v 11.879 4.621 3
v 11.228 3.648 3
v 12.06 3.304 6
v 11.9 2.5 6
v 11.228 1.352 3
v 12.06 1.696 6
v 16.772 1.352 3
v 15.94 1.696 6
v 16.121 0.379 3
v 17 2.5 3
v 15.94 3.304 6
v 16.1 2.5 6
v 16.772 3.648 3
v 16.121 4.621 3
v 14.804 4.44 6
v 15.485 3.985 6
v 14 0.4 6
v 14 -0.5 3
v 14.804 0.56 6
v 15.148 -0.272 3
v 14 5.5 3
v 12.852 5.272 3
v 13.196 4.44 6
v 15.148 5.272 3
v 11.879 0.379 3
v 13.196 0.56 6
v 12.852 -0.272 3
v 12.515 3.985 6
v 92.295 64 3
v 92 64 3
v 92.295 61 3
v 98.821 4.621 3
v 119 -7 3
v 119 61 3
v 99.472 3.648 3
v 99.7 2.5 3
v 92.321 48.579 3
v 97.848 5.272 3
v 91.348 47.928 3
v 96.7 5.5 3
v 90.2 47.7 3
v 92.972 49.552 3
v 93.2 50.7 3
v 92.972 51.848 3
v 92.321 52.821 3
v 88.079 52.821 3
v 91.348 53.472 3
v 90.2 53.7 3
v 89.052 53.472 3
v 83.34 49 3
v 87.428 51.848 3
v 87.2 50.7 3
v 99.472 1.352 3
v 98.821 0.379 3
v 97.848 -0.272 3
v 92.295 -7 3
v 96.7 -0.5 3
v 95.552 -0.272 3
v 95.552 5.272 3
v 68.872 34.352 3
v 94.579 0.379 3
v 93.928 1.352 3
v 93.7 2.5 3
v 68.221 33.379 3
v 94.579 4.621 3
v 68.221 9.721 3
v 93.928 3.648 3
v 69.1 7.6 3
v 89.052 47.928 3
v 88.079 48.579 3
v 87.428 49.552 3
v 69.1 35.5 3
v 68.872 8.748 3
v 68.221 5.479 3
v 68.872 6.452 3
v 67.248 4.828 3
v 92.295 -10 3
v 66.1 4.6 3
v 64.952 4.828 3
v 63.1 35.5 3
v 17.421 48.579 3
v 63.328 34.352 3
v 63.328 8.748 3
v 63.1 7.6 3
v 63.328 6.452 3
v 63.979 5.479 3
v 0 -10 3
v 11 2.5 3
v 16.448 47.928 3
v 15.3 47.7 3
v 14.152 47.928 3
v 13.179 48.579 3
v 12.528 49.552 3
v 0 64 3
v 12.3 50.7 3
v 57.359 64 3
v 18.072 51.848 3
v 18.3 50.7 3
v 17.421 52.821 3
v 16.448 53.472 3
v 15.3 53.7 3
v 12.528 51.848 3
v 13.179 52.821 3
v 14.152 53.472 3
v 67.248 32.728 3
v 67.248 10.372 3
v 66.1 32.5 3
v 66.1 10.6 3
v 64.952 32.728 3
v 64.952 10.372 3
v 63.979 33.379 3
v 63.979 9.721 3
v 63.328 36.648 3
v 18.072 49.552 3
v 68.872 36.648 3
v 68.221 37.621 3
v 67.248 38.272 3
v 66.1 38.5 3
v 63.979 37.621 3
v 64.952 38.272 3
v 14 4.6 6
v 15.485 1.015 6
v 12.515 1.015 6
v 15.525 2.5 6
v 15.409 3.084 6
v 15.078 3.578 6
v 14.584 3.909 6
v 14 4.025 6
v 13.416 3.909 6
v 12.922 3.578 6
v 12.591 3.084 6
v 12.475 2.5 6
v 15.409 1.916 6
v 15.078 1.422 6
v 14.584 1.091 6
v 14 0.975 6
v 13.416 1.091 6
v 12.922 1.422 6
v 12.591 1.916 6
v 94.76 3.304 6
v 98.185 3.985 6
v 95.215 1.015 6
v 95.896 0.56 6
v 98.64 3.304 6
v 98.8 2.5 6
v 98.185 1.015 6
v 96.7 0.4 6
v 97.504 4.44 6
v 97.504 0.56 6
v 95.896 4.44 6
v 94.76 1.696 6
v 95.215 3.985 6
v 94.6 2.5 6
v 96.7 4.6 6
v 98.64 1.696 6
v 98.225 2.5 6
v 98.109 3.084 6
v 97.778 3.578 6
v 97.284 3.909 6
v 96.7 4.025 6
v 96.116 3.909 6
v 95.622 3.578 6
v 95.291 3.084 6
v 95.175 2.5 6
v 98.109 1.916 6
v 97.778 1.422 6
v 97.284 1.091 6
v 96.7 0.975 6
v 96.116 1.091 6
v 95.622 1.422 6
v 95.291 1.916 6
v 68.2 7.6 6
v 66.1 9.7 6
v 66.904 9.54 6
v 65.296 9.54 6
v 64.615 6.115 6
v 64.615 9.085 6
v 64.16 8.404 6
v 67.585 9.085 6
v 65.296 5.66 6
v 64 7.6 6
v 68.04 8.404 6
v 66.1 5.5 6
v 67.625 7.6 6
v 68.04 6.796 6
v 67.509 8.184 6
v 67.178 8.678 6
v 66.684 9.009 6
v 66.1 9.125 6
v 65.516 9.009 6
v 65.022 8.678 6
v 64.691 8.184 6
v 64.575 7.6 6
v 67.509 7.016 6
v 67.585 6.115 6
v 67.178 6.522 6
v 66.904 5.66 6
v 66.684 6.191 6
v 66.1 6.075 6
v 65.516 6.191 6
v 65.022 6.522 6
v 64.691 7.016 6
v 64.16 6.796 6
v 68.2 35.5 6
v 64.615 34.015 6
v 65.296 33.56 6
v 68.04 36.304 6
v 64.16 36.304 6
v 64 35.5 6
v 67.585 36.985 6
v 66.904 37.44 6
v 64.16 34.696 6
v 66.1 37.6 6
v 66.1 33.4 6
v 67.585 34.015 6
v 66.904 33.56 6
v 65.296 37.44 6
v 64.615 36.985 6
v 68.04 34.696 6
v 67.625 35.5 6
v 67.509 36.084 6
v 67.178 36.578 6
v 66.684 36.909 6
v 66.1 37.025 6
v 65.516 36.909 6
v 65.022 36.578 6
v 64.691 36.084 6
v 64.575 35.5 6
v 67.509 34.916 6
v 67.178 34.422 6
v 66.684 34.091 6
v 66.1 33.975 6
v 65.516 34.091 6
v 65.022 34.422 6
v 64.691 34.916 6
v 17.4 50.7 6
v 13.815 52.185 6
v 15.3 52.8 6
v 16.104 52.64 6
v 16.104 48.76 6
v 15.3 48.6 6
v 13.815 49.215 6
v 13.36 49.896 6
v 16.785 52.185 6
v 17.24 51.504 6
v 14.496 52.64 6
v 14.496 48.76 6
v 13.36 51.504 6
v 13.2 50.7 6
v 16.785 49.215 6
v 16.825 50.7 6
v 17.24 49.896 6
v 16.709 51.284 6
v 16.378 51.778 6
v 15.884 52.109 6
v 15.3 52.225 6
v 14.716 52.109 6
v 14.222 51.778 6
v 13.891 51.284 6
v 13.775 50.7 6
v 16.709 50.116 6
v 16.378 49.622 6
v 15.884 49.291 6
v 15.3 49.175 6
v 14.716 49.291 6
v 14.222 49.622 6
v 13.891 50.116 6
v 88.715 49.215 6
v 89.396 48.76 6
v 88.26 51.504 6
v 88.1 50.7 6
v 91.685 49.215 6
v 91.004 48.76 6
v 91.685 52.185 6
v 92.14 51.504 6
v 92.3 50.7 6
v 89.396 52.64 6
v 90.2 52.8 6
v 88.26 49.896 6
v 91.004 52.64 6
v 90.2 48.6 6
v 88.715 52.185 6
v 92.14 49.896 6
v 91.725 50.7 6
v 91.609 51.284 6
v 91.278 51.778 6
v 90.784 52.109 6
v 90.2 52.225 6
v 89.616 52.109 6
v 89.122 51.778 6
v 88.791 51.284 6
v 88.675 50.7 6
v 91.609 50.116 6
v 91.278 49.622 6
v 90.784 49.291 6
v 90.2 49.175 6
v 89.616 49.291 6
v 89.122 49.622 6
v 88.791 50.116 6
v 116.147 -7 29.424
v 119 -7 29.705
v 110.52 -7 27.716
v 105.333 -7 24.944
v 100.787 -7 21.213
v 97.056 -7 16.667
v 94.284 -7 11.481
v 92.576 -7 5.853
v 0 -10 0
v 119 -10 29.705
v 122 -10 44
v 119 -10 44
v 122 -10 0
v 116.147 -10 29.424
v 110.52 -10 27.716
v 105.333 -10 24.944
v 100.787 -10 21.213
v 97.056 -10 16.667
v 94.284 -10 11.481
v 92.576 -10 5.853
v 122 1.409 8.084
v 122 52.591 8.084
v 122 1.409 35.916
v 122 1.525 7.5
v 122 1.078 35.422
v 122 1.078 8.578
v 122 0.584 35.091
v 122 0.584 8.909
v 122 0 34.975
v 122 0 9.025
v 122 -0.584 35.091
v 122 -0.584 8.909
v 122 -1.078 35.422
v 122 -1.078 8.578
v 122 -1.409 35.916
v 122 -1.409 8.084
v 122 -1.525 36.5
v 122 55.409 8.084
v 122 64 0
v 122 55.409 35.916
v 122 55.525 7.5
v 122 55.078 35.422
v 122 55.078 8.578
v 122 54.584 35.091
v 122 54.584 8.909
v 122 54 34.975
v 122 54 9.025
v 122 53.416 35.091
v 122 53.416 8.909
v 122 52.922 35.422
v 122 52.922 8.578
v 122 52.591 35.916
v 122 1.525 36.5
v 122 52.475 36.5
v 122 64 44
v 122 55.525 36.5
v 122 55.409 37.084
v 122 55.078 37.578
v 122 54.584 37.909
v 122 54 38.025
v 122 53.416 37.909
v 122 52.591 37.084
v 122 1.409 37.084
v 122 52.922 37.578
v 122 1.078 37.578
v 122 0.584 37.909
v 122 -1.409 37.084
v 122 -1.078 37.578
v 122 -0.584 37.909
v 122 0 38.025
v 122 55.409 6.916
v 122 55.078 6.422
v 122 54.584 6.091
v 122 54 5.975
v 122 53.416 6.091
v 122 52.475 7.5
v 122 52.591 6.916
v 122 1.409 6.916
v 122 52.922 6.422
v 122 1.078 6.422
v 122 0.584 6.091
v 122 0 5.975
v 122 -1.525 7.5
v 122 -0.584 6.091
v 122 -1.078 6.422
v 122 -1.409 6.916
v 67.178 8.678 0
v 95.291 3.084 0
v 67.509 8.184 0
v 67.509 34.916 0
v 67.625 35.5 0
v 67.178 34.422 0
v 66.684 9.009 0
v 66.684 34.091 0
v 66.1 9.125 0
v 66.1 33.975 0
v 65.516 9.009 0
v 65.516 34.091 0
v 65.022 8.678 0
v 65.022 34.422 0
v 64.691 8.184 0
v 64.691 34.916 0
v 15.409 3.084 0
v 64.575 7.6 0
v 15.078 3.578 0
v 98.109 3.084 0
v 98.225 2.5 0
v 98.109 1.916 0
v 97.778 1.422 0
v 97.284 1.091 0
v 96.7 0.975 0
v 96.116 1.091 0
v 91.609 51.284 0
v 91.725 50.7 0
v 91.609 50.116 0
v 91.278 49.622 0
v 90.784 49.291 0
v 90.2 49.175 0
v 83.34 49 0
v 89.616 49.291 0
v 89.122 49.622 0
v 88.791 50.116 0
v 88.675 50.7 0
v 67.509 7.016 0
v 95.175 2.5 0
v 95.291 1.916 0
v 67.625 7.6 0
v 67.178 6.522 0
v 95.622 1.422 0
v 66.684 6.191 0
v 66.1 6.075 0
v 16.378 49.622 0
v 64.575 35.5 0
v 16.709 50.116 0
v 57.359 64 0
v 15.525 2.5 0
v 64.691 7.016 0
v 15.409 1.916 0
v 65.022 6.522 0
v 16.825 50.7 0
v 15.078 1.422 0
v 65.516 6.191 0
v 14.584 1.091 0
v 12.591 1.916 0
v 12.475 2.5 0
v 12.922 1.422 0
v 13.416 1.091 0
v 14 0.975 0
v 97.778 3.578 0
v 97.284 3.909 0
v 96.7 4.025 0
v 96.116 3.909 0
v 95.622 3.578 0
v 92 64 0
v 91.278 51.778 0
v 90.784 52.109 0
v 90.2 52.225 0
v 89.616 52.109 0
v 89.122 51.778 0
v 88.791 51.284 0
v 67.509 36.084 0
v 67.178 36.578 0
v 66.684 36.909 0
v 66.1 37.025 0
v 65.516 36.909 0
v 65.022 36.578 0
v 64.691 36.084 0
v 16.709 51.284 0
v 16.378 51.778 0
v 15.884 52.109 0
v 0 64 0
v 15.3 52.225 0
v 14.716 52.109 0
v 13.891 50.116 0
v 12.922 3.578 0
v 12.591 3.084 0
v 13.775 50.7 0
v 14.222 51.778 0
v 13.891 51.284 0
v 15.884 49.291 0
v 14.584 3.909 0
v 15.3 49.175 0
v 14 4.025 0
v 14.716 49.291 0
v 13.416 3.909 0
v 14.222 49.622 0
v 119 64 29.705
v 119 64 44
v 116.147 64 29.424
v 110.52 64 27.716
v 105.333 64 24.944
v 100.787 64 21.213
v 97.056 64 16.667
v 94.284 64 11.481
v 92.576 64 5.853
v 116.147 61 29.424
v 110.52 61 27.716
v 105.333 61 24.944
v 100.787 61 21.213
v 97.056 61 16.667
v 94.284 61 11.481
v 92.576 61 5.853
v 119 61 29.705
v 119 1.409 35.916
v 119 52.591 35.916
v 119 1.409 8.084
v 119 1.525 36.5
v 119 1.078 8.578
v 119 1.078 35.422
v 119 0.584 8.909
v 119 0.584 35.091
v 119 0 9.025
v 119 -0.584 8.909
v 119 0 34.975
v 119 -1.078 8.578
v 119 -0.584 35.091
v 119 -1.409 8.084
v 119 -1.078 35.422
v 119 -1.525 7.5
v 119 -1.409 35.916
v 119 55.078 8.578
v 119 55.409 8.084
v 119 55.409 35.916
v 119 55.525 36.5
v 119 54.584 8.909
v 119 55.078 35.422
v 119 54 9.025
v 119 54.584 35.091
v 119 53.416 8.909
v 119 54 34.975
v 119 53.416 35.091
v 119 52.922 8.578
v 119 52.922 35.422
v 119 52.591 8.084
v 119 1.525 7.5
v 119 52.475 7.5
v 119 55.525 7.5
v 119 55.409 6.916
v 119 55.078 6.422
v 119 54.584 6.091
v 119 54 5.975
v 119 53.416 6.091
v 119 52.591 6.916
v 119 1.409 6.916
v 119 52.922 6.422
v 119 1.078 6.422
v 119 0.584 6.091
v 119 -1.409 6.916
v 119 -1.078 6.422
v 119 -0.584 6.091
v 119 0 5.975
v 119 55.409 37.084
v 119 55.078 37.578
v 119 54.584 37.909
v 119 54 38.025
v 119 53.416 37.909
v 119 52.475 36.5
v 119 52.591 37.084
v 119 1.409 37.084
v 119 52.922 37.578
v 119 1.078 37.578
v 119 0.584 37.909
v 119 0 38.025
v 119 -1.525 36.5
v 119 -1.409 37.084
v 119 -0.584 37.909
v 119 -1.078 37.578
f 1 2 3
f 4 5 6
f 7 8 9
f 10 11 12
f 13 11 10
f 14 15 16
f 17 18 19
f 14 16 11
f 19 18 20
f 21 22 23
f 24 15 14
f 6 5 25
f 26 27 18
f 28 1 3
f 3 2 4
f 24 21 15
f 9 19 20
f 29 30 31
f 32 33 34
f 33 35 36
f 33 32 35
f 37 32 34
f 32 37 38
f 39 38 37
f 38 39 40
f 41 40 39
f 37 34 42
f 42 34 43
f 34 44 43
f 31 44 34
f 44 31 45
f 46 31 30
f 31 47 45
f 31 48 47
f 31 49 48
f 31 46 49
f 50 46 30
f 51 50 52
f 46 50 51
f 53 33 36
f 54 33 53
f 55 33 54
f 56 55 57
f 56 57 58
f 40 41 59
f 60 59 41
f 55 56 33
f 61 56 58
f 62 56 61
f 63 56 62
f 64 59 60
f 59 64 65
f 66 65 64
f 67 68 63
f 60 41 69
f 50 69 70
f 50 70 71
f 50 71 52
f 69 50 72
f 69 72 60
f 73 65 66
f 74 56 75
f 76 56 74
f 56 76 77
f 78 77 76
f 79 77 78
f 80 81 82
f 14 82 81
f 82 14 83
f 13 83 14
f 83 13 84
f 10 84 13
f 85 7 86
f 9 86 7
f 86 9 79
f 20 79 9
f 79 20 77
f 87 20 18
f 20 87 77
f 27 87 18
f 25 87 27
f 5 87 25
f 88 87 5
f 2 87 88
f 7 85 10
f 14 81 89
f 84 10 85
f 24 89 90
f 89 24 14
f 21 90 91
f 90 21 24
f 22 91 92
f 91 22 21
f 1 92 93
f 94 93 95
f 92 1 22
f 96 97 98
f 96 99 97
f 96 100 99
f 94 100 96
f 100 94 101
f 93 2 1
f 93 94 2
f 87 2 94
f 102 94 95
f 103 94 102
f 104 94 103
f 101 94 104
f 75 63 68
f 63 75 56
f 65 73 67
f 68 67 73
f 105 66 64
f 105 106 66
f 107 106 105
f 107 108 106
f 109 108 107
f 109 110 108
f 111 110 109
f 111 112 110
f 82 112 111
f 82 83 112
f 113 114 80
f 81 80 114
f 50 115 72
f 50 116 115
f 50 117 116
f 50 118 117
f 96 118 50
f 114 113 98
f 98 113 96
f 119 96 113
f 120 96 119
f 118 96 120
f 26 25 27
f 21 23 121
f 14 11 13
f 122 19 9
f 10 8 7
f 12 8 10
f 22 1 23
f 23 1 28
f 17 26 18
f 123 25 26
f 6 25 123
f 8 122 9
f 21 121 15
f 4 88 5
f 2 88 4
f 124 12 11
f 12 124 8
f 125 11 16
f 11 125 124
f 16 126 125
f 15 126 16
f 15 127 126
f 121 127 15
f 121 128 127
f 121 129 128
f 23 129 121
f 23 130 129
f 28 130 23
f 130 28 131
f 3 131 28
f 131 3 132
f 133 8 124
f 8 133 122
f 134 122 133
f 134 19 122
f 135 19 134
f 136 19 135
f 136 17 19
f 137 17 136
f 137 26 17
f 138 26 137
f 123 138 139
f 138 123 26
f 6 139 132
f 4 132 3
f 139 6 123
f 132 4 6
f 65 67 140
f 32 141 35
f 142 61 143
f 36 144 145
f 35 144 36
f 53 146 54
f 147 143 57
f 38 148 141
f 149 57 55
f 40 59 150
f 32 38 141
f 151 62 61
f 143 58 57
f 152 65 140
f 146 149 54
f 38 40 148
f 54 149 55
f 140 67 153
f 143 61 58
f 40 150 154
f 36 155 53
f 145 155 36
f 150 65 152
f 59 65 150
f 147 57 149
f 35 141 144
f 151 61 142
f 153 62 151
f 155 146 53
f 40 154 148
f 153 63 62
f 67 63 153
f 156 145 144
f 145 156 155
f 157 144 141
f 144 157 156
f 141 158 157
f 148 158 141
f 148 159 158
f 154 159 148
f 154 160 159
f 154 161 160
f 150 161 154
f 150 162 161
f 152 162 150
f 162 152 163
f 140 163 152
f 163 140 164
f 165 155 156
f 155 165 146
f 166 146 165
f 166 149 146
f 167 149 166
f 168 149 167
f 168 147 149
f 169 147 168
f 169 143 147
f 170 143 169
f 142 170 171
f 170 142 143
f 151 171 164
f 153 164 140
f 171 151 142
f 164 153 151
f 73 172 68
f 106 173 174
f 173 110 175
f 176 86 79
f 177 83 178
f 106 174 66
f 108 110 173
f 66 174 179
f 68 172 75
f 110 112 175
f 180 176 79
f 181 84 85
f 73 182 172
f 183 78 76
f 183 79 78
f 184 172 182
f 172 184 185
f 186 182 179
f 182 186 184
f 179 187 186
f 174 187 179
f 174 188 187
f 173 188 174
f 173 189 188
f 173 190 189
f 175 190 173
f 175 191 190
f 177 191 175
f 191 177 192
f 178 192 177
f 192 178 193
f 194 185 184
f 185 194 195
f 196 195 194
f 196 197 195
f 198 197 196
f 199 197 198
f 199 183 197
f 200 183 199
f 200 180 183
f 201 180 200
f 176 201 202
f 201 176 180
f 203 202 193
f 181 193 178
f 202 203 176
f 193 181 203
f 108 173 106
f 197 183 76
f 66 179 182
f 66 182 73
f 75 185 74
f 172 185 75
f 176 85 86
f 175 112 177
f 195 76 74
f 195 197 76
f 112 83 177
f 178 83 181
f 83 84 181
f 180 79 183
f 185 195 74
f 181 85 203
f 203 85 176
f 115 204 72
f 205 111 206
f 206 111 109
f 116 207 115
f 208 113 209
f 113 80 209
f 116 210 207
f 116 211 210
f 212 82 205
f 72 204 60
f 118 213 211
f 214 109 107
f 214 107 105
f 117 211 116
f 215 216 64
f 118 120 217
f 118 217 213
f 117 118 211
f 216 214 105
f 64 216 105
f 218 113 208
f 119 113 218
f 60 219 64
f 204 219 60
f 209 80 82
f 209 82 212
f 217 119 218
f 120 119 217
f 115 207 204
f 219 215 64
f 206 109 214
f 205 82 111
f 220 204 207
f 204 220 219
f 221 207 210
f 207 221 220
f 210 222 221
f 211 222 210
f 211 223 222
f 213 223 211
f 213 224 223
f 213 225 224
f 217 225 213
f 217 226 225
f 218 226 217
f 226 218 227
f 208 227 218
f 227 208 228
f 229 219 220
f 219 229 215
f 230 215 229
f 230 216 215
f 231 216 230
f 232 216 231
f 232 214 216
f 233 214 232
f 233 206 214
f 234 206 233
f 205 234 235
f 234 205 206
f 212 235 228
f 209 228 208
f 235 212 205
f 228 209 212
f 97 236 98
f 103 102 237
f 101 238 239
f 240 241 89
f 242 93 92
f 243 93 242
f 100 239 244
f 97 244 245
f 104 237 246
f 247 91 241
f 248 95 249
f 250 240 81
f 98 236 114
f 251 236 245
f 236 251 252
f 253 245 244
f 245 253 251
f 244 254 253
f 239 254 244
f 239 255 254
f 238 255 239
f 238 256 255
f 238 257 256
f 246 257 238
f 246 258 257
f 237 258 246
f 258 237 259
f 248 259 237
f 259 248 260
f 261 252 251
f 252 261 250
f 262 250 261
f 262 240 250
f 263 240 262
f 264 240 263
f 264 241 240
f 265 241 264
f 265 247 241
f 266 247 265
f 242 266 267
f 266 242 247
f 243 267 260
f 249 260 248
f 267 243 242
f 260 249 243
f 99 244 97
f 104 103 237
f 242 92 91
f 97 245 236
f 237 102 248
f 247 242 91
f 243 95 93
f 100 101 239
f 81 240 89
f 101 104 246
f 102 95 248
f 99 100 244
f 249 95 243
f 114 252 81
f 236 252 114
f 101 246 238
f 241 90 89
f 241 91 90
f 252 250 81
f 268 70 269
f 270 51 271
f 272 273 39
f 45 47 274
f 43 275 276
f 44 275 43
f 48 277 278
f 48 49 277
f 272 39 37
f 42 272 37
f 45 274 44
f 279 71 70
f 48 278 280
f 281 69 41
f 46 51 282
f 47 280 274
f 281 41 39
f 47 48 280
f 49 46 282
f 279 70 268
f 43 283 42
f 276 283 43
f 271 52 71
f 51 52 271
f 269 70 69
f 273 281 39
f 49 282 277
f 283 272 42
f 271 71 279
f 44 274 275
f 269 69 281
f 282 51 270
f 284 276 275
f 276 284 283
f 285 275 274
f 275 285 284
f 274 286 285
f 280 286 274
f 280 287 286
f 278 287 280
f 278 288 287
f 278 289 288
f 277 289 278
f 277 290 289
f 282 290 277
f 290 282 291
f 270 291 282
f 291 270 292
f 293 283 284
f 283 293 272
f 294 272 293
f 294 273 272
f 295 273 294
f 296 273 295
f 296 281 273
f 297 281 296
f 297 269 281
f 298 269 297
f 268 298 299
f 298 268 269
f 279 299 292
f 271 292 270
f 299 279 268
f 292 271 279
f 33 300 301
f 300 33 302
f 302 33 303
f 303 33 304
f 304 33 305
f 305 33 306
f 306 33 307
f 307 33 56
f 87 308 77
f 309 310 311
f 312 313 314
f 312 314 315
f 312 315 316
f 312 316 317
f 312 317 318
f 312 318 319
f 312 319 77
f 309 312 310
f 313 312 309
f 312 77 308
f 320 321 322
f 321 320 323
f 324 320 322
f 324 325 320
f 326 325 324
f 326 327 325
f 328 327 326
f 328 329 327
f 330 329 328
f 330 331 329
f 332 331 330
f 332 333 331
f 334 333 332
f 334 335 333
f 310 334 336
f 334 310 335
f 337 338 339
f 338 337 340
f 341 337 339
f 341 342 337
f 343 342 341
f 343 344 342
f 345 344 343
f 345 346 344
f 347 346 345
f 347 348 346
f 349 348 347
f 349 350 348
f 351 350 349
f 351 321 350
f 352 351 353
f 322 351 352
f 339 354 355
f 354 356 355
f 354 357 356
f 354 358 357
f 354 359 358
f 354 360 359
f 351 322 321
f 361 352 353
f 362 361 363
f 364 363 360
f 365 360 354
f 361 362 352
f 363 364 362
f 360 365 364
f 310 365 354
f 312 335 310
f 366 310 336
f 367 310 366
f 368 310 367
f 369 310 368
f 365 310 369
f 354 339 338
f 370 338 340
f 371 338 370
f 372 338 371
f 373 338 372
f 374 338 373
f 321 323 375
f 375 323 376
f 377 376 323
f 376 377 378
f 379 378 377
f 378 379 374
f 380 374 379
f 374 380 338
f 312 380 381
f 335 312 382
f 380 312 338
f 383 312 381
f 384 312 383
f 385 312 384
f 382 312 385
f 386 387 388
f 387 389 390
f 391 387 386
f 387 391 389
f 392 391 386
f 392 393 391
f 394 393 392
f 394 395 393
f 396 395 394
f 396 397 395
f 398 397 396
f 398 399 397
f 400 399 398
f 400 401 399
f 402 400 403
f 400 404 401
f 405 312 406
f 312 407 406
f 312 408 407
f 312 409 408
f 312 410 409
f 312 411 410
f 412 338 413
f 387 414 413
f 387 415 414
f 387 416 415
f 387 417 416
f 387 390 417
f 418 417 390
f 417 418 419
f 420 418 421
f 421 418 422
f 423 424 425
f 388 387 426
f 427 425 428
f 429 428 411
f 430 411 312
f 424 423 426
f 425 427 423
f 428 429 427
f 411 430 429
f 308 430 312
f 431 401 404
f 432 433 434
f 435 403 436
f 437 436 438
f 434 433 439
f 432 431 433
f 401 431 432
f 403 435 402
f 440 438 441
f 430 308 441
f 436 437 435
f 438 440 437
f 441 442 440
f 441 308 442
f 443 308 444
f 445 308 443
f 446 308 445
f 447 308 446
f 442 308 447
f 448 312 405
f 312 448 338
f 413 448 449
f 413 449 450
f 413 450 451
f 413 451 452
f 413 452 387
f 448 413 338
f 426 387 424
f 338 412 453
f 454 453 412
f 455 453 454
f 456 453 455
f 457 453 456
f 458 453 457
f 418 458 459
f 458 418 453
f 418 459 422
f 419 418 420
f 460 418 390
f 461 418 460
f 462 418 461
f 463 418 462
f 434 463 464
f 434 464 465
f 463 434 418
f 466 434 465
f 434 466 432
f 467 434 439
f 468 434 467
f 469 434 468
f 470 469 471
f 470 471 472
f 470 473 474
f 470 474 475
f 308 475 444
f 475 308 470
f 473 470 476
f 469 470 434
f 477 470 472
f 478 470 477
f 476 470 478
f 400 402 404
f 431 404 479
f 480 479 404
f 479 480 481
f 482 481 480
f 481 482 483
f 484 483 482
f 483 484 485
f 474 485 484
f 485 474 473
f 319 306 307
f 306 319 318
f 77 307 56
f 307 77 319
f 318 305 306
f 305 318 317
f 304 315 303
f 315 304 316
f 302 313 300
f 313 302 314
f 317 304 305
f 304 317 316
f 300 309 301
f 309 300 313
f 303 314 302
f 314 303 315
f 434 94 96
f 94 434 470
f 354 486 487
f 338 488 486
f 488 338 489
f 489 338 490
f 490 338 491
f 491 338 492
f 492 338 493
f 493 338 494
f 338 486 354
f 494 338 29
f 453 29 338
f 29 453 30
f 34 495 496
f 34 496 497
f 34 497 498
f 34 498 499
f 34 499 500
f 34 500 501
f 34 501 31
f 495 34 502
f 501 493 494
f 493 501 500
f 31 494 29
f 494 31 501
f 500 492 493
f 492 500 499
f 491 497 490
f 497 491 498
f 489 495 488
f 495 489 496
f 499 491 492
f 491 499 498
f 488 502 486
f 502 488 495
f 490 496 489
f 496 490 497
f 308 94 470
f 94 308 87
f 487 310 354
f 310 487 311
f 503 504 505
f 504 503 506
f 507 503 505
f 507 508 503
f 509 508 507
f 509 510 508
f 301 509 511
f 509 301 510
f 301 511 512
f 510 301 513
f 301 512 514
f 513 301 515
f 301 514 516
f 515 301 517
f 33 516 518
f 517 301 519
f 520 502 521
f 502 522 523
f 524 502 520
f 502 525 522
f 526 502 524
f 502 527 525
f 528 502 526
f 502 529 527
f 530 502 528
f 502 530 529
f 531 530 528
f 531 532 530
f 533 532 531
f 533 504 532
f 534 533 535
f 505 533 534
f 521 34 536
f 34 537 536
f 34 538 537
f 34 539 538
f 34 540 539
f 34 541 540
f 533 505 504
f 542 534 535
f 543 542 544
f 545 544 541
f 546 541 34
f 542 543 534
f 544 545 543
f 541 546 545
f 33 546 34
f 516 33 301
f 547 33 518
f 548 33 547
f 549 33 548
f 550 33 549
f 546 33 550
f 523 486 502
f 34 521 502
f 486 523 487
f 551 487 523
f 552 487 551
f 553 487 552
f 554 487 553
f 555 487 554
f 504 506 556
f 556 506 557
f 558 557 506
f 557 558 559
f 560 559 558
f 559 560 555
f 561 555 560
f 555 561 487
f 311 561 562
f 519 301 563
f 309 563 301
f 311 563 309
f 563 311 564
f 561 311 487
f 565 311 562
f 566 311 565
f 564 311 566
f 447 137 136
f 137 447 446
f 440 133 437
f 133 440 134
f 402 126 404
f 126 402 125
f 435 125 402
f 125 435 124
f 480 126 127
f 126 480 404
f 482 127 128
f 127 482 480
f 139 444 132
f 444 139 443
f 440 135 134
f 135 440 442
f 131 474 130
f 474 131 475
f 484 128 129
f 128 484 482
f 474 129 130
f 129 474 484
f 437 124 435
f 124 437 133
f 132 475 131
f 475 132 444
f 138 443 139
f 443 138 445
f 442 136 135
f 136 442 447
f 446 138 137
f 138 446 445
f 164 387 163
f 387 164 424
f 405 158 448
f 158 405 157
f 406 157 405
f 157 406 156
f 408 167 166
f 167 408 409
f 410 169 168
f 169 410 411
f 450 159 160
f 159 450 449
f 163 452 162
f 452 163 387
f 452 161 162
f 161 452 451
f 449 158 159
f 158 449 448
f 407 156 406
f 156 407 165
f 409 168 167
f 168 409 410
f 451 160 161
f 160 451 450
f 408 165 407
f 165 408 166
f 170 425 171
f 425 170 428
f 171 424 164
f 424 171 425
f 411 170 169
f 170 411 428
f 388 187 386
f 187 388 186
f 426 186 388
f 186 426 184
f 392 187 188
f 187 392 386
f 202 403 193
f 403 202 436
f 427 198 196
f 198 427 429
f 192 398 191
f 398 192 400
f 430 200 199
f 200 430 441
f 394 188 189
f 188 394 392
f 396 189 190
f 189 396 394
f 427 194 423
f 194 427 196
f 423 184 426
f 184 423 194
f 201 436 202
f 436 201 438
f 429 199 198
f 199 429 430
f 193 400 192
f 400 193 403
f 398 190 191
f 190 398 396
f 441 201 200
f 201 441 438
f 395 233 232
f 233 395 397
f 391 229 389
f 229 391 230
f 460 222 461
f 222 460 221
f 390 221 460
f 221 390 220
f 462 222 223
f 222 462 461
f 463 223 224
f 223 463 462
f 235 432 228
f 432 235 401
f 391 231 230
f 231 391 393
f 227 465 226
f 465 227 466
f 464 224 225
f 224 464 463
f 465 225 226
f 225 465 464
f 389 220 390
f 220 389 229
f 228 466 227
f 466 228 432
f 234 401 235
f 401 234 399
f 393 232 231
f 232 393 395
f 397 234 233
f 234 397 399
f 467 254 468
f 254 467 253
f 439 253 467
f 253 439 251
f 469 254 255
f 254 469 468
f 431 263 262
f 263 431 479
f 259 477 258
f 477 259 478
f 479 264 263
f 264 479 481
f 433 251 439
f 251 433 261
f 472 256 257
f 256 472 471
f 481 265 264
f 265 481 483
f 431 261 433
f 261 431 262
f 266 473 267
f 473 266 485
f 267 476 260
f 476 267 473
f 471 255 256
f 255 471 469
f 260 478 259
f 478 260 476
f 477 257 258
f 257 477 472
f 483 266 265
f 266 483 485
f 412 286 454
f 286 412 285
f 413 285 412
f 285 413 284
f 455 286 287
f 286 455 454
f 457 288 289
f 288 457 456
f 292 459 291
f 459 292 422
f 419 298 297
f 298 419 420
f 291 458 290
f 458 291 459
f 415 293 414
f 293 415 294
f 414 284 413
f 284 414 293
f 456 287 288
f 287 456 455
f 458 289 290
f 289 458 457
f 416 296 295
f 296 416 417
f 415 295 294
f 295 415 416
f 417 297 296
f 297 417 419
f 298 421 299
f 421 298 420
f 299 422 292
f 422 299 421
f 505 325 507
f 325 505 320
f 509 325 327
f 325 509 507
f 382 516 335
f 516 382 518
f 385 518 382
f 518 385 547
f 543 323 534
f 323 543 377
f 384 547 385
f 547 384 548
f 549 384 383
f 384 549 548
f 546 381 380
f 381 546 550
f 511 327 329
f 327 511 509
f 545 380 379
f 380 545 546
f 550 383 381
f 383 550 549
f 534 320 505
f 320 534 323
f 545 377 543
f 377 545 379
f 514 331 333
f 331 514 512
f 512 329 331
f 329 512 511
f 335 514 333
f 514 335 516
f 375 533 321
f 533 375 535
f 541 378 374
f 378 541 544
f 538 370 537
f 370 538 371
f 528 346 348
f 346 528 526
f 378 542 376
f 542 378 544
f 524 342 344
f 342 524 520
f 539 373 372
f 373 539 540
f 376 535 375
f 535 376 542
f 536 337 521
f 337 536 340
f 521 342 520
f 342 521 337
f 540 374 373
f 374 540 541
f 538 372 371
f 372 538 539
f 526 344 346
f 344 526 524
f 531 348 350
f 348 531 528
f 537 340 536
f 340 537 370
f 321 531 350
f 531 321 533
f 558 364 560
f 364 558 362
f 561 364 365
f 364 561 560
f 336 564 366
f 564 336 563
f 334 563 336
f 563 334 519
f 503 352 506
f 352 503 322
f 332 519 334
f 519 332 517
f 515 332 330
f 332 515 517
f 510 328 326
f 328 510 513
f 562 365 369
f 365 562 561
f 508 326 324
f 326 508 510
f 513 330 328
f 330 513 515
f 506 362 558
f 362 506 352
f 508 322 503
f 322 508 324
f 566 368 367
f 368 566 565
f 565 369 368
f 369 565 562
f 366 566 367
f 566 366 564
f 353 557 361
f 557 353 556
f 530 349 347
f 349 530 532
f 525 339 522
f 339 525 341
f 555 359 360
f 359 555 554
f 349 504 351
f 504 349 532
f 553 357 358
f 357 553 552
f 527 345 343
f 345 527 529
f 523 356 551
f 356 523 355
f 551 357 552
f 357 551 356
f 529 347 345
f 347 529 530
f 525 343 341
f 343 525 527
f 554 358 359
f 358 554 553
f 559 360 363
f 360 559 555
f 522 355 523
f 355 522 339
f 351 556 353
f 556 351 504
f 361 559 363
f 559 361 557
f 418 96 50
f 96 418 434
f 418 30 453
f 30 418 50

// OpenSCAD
// Kossel Mini mount for RAMPS 1.4 at bottom location
// Licence: CC BY-SA 3.0, http://creativecommons.org/licenses/by-sa/3.0/
// Author: Dominik Scholz <schlotzz@schlotzz.com> and contributors
// visit: http://www.schlotzz.com


// Increase this if your slicer or printer make holes too tight.
extra_radius = 0.1;


// Major diameter of metric 3mm thread.
m3_major = 2.85;
m3_radius = m3_major / 2 + extra_radius;
m3_wide_radius = m3_major / 2 + extra_radius + 0.2;




module ramps_mount()
{

	// define base plate
	base_plate = [102, 54, 3];
	base_plate_delta = [20, 20, 0];
	base_plate_offset = [10, 0, 0];

	// define mounting hole offsets
	base_hole_offsets = [
		[14, 2.5, 0],
		[96.7, 2.5, 0],
		[66.1, 7.6, 0],
		[66.1, 35.5, 0],
		[15.3, 50.7, 0],
		[90.2, 50.7, 0]
	];

	// define mounting plate
	mounting_plate = [3, base_plate[1] + base_plate_delta[1], 44];
	mounting_plate_offset = [base_plate[0] + base_plate_delta[0] - mounting_plate[0], 0, 0];

	// define mounting hole offsets
	mounting_hole_offsets = [
		[0, 0, 7.5],
		[0, base_plate[1], 7.5],
		[0, 0, 36.5],
		[0, base_plate[1], 36.5],
	];

	// define joint enforcement
	joint_enforcement_radius = 30;
	joint_enforcement_thickness = 3;
	joint_enforcement_offsets = [
		[base_plate[0] + base_plate_delta[0], -base_plate_delta[0] / 2, 0],
		[base_plate[0] + base_plate_delta[0], base_plate[1] + base_plate_delta[0] / 2 - joint_enforcement_thickness, 0],
	];

	// define domes
	dome_height = 3;
	dome_base_width = 6;
	dome_top_width = 4.2;

	// stepper cutout
	stepper_cutout_depth = 15;
	stepper_cutout_offset = [
		base_plate[0] + base_plate_delta[0] - joint_enforcement_radius - tan(30) * stepper_cutout_depth,
		base_plate[1] + base_plate_delta[1] / 2 - stepper_cutout_depth,
		0
	];

	difference()
	{
		
		union()
		{
			// base plate
			translate(base_plate_offset - base_plate_delta / 2)
				cube(base_plate + base_plate_delta, center = false);

			// mounting plate
			translate(base_plate_offset - base_plate_delta / 2 + mounting_plate_offset)
				cube(mounting_plate);

			// domes
			for (a = base_hole_offsets)
				translate(a + [0, 0, base_plate[2]])
					cylinder(r1 = dome_base_width / 2, r2 = dome_top_width / 2, h = dome_height, $fn = 16);
			
			// joint enforcement
			for (a = joint_enforcement_offsets)
				translate(a)
					rotate([90, 0, 180])
						intersection()
						{
							cube([joint_enforcement_radius, joint_enforcement_radius, joint_enforcement_thickness]);
							cylinder(r = joint_enforcement_radius, h = joint_enforcement_thickness, $fn = 32);
						}
		}

		// base holes
		for (a = base_hole_offsets)
			translate(a)
				cylinder(r = m3_radius, h = 50, center = true, $fn = 16);

		// mounting holes
		for (a = mounting_hole_offsets)
			translate(a + mounting_plate_offset)
				rotate([0, 90, 0])
					cylinder(r = m3_radius, h = 50, center = true, $fn = 16);

		// cutout for stepper motor
		translate(stepper_cutout_offset - [0, 0, 1])
			rotate([0, 0, 60])
				cube([stepper_cutout_depth * 2, stepper_cutout_depth * 2, base_plate[2] + 2]);
	}
	

}

ramps_mount();
